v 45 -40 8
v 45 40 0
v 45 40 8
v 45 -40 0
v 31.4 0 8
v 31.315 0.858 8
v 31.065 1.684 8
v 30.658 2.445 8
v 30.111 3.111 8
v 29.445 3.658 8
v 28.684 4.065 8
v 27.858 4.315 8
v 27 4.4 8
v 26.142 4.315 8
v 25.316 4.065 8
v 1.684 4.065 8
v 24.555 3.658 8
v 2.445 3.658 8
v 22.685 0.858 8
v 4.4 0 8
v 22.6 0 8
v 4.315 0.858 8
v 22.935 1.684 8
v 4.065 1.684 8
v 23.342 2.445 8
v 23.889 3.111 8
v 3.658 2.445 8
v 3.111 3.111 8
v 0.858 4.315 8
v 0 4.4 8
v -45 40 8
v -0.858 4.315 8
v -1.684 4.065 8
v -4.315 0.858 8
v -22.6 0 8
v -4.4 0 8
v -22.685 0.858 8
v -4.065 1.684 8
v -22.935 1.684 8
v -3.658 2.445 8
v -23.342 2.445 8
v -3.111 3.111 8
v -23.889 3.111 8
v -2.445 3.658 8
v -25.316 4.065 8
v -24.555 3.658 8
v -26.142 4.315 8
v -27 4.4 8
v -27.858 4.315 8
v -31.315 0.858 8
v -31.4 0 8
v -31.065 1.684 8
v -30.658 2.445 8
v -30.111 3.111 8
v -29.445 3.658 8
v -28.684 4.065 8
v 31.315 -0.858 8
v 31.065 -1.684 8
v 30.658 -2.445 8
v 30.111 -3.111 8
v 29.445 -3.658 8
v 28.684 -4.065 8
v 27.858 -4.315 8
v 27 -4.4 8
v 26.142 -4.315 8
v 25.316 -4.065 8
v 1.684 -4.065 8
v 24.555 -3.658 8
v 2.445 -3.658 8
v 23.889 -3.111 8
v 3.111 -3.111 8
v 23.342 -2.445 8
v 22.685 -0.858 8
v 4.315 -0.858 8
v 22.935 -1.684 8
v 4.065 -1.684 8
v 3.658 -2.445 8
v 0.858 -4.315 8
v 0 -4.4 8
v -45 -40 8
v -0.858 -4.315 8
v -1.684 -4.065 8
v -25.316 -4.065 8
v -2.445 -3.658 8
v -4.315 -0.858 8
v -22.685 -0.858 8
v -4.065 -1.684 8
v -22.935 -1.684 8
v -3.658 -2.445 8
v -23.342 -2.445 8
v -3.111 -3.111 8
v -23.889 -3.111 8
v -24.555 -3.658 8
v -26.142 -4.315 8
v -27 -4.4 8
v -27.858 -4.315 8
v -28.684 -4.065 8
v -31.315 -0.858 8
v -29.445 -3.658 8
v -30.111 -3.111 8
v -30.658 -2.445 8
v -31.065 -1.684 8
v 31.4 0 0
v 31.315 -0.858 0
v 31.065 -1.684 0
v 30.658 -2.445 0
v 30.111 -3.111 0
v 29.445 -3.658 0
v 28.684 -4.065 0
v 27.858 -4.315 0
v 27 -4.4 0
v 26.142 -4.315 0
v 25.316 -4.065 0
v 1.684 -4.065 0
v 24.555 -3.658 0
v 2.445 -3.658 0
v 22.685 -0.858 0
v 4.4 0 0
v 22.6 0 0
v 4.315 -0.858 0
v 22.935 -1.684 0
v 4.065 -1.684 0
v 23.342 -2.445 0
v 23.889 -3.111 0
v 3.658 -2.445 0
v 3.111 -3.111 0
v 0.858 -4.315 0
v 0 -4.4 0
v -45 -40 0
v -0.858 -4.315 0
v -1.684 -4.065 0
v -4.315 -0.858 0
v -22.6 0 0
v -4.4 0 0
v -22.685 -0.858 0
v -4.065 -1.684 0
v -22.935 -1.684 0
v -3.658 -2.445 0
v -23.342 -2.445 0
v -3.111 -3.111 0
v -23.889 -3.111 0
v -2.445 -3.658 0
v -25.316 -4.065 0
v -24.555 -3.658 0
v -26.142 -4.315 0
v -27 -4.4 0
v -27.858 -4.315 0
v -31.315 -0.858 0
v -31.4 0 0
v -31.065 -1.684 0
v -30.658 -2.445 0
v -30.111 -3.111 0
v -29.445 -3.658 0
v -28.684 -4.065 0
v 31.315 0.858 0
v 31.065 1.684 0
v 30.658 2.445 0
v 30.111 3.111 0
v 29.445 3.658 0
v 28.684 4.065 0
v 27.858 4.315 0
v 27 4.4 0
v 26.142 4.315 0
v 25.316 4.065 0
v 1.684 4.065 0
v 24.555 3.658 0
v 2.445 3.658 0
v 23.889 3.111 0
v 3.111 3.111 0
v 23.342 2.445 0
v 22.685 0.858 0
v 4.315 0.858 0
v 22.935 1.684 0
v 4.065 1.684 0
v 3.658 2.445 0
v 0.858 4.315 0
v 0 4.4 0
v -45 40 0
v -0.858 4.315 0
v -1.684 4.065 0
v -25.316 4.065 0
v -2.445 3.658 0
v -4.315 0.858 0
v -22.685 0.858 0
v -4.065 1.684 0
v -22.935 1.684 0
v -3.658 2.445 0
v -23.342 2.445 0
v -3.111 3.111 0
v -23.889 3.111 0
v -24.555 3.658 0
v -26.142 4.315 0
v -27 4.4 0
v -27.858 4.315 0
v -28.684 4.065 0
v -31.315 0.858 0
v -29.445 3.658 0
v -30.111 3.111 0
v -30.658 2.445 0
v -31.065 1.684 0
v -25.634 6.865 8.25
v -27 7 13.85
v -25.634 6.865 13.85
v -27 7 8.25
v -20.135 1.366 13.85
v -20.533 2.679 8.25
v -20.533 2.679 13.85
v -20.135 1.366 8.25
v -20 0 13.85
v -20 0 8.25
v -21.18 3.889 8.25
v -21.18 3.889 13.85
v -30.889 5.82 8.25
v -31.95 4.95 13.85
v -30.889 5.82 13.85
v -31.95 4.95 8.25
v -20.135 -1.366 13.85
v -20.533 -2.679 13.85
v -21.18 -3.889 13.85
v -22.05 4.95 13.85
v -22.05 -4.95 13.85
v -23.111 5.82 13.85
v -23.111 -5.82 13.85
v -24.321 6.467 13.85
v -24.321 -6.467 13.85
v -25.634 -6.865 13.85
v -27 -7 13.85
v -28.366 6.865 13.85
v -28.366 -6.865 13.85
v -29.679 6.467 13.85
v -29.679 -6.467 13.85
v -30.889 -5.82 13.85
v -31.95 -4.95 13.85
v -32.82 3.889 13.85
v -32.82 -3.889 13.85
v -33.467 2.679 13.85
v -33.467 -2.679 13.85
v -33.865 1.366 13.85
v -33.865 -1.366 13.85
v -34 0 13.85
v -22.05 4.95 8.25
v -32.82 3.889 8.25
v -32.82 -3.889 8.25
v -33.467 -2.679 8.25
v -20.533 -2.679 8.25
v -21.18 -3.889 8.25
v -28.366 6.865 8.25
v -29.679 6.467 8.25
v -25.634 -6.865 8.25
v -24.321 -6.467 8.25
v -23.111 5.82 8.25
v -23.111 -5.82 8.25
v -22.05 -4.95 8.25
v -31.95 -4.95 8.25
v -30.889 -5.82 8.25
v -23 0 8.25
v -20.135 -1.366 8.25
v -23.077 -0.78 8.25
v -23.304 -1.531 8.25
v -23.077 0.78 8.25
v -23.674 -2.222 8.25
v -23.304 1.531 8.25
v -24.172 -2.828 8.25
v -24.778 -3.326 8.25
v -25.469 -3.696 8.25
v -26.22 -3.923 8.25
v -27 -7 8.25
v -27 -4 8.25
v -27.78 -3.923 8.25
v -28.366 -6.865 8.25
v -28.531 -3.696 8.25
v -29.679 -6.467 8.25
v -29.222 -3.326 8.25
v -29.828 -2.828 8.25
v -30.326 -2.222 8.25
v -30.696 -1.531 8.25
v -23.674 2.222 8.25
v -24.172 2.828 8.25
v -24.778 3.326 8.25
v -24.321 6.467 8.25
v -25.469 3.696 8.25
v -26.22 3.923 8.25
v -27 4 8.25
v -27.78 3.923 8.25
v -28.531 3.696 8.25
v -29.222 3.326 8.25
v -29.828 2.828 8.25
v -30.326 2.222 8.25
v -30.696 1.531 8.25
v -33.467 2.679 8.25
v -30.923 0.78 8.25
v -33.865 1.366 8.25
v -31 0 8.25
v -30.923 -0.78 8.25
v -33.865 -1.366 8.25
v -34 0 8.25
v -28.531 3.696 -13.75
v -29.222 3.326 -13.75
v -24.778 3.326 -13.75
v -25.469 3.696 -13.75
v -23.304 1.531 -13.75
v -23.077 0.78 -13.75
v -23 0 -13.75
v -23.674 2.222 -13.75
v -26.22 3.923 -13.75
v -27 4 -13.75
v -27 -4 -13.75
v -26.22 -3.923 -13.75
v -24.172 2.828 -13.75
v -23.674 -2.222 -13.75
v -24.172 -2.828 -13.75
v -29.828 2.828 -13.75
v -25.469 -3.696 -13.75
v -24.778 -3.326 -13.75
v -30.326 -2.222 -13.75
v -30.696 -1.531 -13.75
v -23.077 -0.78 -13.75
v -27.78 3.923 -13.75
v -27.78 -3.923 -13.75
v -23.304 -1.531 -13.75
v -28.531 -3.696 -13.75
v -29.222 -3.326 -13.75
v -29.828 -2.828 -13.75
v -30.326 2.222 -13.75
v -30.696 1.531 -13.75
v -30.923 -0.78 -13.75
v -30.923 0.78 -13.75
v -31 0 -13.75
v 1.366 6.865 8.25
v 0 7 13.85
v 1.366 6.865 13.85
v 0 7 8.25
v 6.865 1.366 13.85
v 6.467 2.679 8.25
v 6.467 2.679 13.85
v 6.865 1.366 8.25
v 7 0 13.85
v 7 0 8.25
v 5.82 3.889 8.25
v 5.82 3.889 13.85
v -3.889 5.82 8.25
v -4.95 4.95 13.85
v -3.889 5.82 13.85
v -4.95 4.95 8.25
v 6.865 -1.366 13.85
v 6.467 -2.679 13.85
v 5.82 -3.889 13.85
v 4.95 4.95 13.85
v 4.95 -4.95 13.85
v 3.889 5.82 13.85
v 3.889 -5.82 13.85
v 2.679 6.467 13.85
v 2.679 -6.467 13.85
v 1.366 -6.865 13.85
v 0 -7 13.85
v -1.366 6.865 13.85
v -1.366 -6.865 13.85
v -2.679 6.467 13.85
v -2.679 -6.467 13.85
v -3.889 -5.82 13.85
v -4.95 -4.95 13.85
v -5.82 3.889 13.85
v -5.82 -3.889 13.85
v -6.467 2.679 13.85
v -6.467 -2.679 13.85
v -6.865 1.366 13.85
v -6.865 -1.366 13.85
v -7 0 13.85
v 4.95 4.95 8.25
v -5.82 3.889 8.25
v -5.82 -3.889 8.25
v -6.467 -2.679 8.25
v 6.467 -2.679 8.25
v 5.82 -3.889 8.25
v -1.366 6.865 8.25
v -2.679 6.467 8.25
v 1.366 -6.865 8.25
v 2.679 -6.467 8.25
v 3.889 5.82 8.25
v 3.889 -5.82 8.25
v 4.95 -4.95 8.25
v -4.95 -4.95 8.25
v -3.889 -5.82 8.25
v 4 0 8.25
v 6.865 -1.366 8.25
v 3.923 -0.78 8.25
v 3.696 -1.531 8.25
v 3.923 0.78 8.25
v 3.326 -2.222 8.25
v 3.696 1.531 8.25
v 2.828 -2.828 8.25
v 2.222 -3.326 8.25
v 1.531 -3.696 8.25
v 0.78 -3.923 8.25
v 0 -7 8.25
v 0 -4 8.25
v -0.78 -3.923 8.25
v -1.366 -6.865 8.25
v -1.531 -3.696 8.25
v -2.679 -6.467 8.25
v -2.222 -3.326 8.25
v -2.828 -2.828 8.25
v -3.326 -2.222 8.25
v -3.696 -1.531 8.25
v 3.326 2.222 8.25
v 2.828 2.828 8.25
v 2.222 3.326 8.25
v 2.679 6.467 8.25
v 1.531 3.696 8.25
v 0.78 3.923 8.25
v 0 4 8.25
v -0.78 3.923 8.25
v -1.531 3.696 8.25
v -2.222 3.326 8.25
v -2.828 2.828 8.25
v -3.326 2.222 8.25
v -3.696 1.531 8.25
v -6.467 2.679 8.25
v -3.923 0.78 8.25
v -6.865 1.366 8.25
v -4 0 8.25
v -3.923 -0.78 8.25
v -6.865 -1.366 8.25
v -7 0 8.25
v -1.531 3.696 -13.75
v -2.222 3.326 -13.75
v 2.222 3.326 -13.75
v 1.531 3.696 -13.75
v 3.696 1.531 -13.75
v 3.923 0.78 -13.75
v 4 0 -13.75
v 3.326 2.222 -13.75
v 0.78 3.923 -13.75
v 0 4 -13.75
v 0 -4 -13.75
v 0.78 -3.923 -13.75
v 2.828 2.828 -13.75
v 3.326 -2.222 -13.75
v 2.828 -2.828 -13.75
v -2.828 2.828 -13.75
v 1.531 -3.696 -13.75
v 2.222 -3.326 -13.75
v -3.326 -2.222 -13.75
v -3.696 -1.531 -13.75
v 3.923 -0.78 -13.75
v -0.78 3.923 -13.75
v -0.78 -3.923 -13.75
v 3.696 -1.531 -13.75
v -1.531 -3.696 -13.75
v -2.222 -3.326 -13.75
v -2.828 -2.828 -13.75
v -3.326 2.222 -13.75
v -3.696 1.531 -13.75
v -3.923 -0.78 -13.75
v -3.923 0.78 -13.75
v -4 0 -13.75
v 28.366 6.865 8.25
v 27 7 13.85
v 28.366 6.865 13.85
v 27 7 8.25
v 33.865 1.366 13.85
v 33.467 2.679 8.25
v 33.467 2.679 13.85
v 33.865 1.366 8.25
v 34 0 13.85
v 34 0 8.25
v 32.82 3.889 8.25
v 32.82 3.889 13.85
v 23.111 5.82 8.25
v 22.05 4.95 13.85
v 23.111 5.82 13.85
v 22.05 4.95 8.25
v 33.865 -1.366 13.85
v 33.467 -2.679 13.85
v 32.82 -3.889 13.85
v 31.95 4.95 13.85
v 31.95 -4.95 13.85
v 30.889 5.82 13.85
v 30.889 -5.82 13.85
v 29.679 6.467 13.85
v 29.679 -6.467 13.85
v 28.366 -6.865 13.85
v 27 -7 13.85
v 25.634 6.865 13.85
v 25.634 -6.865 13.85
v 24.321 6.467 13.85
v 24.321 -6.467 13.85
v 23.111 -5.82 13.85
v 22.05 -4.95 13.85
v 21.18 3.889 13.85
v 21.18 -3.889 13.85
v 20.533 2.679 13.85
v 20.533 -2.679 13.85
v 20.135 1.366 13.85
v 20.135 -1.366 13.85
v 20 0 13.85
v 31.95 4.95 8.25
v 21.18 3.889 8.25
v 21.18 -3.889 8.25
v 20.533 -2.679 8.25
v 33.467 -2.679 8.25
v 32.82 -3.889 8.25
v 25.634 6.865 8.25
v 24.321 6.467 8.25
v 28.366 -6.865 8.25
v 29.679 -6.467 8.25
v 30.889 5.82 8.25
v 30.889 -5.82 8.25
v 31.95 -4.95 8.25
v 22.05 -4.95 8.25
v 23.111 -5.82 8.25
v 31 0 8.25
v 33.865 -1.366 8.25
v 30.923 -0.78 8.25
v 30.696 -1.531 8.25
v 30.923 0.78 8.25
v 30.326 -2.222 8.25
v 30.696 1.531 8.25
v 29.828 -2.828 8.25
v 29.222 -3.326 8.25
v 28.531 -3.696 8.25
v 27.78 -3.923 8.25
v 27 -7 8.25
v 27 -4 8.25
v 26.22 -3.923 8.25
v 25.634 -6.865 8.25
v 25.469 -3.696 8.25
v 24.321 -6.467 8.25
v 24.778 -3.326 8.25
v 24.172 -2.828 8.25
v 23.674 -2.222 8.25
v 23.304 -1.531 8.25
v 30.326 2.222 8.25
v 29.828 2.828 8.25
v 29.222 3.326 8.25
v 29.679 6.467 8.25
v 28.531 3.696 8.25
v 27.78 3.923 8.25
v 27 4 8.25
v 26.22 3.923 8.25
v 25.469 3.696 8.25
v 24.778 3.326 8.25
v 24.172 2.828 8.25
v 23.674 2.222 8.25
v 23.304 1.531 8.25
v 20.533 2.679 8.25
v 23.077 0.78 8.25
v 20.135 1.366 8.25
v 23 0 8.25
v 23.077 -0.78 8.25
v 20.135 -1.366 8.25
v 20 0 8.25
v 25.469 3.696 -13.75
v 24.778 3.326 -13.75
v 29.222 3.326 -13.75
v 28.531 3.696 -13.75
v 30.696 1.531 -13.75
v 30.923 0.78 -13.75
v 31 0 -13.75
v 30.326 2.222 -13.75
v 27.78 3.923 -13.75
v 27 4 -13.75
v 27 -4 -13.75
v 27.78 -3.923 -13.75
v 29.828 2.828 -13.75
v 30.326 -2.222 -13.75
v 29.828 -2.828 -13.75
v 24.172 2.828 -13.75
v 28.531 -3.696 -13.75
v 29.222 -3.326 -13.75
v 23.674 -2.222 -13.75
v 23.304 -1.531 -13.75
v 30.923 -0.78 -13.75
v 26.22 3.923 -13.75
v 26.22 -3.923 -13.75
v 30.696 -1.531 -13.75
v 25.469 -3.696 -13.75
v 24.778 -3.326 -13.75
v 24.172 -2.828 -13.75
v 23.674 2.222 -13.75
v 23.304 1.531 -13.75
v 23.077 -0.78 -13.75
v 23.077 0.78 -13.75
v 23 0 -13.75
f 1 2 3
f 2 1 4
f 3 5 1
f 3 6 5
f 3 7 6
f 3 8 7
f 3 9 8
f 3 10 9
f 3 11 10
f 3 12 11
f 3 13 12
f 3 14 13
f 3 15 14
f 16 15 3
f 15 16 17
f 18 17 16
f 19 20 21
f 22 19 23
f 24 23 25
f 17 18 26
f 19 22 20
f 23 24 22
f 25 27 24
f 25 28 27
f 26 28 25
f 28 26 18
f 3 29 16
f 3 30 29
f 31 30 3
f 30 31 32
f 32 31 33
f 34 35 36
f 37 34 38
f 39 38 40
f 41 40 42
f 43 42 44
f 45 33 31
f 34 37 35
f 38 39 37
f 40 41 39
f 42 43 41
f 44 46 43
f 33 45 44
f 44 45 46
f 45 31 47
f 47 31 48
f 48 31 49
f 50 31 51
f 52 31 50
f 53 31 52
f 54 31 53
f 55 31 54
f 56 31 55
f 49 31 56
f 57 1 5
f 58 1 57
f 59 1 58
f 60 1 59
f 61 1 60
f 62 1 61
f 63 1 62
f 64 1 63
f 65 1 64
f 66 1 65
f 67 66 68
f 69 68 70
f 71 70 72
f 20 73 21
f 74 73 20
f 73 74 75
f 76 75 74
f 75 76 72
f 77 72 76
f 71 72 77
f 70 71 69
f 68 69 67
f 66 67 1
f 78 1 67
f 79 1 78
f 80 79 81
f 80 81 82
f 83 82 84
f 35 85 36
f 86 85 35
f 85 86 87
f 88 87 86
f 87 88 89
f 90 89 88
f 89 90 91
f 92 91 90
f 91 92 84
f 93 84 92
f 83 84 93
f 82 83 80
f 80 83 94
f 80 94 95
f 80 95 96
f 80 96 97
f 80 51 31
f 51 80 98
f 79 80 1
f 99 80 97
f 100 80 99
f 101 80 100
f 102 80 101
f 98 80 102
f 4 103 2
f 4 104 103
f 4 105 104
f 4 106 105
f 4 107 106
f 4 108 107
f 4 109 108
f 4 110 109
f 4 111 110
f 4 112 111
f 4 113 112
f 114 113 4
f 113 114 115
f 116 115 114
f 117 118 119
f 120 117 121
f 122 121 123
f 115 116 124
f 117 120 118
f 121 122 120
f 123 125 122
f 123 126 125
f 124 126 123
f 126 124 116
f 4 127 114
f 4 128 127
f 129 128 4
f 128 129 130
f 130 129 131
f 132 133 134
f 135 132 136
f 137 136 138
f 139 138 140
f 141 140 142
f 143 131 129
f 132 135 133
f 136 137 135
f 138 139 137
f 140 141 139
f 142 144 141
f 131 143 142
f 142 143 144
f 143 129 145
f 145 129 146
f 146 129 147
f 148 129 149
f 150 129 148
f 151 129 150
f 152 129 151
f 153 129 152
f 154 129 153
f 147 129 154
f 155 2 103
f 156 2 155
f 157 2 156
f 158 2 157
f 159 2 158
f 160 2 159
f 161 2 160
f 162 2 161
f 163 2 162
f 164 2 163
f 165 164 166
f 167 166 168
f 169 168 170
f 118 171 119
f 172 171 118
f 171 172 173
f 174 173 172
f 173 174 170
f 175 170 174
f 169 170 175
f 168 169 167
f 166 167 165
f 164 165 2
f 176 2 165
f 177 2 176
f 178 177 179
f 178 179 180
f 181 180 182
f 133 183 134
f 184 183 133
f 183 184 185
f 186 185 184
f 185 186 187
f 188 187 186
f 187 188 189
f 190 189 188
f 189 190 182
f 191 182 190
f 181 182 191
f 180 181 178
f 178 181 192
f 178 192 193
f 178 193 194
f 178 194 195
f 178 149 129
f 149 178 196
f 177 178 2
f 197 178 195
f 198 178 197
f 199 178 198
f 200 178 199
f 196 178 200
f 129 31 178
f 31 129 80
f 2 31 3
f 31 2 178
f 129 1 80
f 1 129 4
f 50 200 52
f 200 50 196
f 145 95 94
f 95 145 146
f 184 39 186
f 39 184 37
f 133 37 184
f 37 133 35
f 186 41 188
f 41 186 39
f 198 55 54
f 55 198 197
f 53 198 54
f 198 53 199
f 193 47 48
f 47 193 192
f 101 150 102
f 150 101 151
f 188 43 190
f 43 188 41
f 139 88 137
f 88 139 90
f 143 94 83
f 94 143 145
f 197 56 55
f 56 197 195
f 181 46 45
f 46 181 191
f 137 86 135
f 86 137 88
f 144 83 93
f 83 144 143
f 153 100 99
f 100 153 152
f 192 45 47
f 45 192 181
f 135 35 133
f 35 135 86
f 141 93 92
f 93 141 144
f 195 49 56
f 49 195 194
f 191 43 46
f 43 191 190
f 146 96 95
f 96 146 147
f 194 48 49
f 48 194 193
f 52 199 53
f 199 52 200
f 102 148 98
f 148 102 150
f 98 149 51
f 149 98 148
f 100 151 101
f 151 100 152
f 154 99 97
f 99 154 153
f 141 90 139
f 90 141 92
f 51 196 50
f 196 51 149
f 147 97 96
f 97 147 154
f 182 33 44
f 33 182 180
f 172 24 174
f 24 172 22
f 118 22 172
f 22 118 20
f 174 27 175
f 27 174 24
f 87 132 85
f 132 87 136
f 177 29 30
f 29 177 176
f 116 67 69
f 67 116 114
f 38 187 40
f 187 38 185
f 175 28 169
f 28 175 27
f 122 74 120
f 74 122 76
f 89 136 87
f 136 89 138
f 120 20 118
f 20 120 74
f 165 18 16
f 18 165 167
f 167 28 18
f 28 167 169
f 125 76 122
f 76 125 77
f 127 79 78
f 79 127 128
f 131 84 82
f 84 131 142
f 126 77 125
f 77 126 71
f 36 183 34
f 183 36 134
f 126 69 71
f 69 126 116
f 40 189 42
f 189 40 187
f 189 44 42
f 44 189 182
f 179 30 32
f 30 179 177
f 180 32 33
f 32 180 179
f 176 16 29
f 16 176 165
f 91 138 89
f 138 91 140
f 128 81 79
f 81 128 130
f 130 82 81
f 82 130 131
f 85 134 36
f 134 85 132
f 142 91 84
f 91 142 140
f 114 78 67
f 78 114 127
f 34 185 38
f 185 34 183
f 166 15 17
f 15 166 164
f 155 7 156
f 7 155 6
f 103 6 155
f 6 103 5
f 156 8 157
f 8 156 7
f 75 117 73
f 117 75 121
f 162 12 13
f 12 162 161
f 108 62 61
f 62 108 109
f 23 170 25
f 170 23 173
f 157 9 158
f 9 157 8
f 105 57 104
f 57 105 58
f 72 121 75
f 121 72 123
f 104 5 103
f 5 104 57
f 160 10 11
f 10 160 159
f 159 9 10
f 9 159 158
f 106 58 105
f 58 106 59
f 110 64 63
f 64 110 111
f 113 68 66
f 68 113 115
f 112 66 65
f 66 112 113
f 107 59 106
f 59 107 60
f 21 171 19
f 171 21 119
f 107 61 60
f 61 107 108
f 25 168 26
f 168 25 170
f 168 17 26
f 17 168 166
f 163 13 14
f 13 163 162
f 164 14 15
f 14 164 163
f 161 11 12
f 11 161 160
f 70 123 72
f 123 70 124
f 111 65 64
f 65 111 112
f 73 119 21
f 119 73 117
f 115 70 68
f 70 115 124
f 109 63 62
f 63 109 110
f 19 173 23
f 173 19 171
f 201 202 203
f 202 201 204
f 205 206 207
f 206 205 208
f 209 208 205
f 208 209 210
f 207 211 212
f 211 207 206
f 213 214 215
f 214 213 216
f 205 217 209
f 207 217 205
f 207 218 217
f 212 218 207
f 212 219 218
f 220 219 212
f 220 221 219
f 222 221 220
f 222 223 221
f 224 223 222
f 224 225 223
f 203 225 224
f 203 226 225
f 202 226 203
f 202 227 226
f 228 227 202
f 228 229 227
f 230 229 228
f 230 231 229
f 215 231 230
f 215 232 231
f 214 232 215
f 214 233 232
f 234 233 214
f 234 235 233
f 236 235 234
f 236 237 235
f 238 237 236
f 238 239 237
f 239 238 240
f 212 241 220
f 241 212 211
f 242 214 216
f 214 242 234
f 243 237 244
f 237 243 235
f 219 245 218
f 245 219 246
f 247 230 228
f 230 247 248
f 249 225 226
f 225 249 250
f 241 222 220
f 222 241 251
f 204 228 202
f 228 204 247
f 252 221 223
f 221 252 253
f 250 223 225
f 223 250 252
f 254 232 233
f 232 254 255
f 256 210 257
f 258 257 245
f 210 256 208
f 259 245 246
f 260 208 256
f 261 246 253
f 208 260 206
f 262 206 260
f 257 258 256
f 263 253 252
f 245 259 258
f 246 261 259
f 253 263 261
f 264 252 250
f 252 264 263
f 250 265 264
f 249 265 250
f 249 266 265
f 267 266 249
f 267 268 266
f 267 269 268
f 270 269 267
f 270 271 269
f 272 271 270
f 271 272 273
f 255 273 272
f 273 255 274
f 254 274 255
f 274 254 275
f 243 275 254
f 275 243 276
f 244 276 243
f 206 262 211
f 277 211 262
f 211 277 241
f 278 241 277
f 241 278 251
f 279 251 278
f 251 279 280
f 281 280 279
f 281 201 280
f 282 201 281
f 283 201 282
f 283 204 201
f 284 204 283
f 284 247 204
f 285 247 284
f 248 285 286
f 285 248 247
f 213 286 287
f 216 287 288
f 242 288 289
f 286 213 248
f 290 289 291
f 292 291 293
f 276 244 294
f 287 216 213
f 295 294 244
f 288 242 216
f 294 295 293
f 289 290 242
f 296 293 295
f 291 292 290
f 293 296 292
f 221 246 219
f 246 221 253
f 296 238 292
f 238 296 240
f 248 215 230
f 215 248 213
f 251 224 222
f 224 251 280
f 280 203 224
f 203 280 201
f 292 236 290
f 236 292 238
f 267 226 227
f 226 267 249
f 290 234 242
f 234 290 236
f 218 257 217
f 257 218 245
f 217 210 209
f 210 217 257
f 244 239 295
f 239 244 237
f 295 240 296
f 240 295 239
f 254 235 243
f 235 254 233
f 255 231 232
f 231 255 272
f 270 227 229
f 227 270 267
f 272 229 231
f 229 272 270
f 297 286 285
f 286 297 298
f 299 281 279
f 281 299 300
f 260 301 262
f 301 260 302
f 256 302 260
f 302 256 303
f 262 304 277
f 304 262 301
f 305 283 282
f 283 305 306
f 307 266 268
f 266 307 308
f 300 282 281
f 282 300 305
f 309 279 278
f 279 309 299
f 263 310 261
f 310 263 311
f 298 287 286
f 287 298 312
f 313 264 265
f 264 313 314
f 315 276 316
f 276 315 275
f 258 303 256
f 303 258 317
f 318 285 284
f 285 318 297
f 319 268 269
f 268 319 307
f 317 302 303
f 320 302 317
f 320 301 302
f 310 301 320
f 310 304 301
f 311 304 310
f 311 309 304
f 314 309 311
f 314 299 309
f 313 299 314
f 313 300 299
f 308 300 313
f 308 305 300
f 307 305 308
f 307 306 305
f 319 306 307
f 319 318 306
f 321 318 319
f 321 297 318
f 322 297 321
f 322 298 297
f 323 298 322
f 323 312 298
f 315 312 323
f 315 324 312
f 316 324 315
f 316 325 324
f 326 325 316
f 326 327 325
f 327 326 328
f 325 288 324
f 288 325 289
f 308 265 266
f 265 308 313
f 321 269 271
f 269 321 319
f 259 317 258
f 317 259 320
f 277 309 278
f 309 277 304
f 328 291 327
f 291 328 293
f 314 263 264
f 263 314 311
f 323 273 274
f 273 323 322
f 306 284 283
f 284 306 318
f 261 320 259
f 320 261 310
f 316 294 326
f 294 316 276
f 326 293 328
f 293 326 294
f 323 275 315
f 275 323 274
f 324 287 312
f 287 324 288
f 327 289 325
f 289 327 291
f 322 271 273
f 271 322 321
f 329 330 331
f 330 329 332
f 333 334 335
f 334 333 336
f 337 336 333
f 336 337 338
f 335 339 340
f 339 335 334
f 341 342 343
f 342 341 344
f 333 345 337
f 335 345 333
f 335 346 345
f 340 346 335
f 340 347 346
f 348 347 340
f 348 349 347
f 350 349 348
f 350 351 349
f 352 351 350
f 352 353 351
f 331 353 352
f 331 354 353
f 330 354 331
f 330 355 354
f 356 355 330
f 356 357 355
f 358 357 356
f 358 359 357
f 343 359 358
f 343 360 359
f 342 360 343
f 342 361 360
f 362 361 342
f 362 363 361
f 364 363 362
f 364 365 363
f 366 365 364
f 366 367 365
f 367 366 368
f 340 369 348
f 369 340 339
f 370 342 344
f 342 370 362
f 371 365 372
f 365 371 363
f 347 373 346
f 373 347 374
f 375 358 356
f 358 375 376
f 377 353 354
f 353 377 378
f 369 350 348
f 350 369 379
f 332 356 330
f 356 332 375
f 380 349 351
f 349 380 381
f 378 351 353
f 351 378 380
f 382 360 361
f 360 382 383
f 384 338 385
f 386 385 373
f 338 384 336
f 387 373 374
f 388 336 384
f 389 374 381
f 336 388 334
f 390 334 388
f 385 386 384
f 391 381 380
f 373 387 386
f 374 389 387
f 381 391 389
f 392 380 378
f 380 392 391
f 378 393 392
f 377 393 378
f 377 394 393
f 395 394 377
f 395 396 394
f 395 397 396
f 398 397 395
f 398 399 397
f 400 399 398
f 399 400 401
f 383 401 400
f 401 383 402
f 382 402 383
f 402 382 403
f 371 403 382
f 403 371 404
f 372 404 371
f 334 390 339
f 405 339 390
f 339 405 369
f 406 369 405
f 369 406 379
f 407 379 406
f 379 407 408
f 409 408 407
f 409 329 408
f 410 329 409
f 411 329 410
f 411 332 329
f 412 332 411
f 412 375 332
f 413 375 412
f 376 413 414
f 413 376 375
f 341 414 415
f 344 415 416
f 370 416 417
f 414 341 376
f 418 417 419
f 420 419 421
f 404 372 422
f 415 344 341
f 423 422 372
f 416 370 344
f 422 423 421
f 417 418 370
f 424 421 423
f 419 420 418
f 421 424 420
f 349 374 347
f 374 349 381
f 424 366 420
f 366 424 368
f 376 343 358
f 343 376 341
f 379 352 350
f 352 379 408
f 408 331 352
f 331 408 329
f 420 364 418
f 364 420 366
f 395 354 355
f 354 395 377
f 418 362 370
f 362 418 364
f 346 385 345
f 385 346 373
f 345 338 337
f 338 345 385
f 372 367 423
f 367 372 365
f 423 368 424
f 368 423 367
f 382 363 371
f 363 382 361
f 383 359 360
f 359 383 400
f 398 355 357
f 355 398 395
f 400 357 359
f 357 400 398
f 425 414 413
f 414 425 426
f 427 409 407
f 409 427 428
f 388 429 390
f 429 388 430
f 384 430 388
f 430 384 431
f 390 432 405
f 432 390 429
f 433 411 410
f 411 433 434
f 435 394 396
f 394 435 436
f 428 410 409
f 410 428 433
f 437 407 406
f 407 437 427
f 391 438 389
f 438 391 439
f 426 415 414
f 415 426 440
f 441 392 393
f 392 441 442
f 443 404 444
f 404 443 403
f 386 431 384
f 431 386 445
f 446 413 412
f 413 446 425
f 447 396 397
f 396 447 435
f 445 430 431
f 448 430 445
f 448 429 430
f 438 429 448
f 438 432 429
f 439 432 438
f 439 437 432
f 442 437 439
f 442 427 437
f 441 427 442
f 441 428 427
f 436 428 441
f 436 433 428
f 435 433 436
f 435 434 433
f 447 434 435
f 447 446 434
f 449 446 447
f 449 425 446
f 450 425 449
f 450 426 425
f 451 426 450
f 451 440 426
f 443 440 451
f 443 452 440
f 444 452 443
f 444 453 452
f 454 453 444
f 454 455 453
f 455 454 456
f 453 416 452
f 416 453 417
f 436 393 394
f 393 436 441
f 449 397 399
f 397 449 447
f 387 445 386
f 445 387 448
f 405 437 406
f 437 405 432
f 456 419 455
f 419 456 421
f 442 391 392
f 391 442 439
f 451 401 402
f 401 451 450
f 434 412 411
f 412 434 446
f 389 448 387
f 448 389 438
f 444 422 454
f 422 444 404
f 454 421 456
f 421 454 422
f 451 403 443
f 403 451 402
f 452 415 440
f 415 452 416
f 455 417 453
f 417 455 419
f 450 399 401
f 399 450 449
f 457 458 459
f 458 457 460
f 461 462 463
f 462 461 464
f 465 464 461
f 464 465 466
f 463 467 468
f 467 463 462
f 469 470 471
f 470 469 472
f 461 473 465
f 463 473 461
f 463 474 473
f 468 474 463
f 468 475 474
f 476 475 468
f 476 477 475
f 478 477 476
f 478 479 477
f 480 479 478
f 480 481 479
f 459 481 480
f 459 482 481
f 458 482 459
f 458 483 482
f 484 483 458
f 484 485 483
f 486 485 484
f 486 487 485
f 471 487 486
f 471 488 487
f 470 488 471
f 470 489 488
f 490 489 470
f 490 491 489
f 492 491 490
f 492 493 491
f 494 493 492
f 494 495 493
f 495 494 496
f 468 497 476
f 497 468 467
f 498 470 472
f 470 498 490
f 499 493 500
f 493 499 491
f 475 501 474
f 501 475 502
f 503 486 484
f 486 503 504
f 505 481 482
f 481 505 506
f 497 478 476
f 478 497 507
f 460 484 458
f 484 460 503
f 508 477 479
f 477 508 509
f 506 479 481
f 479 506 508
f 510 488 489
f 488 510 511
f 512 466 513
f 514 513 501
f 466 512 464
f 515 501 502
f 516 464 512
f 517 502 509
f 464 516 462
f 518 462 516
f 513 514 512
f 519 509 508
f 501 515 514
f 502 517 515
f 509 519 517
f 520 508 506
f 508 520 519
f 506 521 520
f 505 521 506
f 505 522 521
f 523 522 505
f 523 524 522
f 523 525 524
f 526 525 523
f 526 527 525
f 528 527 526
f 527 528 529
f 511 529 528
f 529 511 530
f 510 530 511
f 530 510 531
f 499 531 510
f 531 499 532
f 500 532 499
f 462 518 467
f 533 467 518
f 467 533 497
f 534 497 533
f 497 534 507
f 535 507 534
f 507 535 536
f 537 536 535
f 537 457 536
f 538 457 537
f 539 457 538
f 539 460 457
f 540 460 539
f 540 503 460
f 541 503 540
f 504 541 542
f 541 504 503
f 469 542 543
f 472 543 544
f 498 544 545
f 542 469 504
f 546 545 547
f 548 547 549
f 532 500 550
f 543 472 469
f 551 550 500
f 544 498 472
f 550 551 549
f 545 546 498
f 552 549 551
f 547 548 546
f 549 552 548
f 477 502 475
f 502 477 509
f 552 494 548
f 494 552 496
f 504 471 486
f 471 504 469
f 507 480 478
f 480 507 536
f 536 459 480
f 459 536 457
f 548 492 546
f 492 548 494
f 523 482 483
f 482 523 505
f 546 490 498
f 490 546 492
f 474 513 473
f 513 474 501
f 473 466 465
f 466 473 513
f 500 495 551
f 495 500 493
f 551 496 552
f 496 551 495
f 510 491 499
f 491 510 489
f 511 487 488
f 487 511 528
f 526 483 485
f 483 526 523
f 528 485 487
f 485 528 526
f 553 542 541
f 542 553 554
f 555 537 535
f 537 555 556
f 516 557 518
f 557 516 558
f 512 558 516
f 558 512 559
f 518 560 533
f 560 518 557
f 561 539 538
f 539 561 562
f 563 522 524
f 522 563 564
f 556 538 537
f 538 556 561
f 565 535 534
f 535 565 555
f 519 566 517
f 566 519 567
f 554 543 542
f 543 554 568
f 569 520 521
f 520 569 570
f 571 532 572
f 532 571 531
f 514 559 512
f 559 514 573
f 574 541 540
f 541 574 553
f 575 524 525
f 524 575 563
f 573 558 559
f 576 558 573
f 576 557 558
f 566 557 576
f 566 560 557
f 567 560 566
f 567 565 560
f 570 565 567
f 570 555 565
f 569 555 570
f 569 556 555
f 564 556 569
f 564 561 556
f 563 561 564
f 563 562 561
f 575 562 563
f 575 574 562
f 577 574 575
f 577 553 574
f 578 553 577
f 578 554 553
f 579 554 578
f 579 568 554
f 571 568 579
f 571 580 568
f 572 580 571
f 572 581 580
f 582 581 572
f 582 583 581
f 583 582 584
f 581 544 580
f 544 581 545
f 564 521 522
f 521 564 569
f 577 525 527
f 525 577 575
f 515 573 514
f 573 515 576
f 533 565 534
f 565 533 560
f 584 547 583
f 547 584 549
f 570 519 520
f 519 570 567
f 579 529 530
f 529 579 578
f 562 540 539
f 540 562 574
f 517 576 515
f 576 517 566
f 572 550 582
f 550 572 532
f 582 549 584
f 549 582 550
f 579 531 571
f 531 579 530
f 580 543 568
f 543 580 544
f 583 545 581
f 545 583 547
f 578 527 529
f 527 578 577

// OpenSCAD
$fn = 32;

// ------------------------------------------------------------------------
// Bolted plate: 90 x 80 x 8 mm plate, 3 fasteners
// Every part is its own module, assembly() places them once.
// ------------------------------------------------------------------------

// --- part 1 ---
module plate() {
  difference() {
    translate([-45, -40, 0]) cube([90, 80, 8]);
    translate([-27, 0, -1]) cylinder(h = 10, d = 8.8);
    translate([0, 0, -1]) cylinder(h = 10, d = 8.8);
    translate([27, 0, -1]) cylinder(h = 10, d = 8.8);
  }
}

// --- part 2 ---
module bolt1() {
  cylinder(h = 5.6, d = 14);
  translate([0, 0, -22]) cylinder(h = 22, d = 8);
}

// --- part 3 ---
module bolt2() {
  cylinder(h = 5.6, d = 14);
  translate([0, 0, -22]) cylinder(h = 22, d = 8);
}

// --- part 4 ---
module bolt3() {
  cylinder(h = 5.6, d = 14);
  translate([0, 0, -22]) cylinder(h = 22, d = 8);
}

// --- assembly ---
module assembly() {
  translate([0, 0, 0]) rotate([0, 0, 0]) plate();
  translate([-27, 0, 8.25]) rotate([0, 0, 0]) bolt1();
  translate([0, 0, 8.25]) rotate([0, 0, 0]) bolt2();
  translate([27, 0, 8.25]) rotate([0, 0, 0]) bolt3();
}

assembly();
